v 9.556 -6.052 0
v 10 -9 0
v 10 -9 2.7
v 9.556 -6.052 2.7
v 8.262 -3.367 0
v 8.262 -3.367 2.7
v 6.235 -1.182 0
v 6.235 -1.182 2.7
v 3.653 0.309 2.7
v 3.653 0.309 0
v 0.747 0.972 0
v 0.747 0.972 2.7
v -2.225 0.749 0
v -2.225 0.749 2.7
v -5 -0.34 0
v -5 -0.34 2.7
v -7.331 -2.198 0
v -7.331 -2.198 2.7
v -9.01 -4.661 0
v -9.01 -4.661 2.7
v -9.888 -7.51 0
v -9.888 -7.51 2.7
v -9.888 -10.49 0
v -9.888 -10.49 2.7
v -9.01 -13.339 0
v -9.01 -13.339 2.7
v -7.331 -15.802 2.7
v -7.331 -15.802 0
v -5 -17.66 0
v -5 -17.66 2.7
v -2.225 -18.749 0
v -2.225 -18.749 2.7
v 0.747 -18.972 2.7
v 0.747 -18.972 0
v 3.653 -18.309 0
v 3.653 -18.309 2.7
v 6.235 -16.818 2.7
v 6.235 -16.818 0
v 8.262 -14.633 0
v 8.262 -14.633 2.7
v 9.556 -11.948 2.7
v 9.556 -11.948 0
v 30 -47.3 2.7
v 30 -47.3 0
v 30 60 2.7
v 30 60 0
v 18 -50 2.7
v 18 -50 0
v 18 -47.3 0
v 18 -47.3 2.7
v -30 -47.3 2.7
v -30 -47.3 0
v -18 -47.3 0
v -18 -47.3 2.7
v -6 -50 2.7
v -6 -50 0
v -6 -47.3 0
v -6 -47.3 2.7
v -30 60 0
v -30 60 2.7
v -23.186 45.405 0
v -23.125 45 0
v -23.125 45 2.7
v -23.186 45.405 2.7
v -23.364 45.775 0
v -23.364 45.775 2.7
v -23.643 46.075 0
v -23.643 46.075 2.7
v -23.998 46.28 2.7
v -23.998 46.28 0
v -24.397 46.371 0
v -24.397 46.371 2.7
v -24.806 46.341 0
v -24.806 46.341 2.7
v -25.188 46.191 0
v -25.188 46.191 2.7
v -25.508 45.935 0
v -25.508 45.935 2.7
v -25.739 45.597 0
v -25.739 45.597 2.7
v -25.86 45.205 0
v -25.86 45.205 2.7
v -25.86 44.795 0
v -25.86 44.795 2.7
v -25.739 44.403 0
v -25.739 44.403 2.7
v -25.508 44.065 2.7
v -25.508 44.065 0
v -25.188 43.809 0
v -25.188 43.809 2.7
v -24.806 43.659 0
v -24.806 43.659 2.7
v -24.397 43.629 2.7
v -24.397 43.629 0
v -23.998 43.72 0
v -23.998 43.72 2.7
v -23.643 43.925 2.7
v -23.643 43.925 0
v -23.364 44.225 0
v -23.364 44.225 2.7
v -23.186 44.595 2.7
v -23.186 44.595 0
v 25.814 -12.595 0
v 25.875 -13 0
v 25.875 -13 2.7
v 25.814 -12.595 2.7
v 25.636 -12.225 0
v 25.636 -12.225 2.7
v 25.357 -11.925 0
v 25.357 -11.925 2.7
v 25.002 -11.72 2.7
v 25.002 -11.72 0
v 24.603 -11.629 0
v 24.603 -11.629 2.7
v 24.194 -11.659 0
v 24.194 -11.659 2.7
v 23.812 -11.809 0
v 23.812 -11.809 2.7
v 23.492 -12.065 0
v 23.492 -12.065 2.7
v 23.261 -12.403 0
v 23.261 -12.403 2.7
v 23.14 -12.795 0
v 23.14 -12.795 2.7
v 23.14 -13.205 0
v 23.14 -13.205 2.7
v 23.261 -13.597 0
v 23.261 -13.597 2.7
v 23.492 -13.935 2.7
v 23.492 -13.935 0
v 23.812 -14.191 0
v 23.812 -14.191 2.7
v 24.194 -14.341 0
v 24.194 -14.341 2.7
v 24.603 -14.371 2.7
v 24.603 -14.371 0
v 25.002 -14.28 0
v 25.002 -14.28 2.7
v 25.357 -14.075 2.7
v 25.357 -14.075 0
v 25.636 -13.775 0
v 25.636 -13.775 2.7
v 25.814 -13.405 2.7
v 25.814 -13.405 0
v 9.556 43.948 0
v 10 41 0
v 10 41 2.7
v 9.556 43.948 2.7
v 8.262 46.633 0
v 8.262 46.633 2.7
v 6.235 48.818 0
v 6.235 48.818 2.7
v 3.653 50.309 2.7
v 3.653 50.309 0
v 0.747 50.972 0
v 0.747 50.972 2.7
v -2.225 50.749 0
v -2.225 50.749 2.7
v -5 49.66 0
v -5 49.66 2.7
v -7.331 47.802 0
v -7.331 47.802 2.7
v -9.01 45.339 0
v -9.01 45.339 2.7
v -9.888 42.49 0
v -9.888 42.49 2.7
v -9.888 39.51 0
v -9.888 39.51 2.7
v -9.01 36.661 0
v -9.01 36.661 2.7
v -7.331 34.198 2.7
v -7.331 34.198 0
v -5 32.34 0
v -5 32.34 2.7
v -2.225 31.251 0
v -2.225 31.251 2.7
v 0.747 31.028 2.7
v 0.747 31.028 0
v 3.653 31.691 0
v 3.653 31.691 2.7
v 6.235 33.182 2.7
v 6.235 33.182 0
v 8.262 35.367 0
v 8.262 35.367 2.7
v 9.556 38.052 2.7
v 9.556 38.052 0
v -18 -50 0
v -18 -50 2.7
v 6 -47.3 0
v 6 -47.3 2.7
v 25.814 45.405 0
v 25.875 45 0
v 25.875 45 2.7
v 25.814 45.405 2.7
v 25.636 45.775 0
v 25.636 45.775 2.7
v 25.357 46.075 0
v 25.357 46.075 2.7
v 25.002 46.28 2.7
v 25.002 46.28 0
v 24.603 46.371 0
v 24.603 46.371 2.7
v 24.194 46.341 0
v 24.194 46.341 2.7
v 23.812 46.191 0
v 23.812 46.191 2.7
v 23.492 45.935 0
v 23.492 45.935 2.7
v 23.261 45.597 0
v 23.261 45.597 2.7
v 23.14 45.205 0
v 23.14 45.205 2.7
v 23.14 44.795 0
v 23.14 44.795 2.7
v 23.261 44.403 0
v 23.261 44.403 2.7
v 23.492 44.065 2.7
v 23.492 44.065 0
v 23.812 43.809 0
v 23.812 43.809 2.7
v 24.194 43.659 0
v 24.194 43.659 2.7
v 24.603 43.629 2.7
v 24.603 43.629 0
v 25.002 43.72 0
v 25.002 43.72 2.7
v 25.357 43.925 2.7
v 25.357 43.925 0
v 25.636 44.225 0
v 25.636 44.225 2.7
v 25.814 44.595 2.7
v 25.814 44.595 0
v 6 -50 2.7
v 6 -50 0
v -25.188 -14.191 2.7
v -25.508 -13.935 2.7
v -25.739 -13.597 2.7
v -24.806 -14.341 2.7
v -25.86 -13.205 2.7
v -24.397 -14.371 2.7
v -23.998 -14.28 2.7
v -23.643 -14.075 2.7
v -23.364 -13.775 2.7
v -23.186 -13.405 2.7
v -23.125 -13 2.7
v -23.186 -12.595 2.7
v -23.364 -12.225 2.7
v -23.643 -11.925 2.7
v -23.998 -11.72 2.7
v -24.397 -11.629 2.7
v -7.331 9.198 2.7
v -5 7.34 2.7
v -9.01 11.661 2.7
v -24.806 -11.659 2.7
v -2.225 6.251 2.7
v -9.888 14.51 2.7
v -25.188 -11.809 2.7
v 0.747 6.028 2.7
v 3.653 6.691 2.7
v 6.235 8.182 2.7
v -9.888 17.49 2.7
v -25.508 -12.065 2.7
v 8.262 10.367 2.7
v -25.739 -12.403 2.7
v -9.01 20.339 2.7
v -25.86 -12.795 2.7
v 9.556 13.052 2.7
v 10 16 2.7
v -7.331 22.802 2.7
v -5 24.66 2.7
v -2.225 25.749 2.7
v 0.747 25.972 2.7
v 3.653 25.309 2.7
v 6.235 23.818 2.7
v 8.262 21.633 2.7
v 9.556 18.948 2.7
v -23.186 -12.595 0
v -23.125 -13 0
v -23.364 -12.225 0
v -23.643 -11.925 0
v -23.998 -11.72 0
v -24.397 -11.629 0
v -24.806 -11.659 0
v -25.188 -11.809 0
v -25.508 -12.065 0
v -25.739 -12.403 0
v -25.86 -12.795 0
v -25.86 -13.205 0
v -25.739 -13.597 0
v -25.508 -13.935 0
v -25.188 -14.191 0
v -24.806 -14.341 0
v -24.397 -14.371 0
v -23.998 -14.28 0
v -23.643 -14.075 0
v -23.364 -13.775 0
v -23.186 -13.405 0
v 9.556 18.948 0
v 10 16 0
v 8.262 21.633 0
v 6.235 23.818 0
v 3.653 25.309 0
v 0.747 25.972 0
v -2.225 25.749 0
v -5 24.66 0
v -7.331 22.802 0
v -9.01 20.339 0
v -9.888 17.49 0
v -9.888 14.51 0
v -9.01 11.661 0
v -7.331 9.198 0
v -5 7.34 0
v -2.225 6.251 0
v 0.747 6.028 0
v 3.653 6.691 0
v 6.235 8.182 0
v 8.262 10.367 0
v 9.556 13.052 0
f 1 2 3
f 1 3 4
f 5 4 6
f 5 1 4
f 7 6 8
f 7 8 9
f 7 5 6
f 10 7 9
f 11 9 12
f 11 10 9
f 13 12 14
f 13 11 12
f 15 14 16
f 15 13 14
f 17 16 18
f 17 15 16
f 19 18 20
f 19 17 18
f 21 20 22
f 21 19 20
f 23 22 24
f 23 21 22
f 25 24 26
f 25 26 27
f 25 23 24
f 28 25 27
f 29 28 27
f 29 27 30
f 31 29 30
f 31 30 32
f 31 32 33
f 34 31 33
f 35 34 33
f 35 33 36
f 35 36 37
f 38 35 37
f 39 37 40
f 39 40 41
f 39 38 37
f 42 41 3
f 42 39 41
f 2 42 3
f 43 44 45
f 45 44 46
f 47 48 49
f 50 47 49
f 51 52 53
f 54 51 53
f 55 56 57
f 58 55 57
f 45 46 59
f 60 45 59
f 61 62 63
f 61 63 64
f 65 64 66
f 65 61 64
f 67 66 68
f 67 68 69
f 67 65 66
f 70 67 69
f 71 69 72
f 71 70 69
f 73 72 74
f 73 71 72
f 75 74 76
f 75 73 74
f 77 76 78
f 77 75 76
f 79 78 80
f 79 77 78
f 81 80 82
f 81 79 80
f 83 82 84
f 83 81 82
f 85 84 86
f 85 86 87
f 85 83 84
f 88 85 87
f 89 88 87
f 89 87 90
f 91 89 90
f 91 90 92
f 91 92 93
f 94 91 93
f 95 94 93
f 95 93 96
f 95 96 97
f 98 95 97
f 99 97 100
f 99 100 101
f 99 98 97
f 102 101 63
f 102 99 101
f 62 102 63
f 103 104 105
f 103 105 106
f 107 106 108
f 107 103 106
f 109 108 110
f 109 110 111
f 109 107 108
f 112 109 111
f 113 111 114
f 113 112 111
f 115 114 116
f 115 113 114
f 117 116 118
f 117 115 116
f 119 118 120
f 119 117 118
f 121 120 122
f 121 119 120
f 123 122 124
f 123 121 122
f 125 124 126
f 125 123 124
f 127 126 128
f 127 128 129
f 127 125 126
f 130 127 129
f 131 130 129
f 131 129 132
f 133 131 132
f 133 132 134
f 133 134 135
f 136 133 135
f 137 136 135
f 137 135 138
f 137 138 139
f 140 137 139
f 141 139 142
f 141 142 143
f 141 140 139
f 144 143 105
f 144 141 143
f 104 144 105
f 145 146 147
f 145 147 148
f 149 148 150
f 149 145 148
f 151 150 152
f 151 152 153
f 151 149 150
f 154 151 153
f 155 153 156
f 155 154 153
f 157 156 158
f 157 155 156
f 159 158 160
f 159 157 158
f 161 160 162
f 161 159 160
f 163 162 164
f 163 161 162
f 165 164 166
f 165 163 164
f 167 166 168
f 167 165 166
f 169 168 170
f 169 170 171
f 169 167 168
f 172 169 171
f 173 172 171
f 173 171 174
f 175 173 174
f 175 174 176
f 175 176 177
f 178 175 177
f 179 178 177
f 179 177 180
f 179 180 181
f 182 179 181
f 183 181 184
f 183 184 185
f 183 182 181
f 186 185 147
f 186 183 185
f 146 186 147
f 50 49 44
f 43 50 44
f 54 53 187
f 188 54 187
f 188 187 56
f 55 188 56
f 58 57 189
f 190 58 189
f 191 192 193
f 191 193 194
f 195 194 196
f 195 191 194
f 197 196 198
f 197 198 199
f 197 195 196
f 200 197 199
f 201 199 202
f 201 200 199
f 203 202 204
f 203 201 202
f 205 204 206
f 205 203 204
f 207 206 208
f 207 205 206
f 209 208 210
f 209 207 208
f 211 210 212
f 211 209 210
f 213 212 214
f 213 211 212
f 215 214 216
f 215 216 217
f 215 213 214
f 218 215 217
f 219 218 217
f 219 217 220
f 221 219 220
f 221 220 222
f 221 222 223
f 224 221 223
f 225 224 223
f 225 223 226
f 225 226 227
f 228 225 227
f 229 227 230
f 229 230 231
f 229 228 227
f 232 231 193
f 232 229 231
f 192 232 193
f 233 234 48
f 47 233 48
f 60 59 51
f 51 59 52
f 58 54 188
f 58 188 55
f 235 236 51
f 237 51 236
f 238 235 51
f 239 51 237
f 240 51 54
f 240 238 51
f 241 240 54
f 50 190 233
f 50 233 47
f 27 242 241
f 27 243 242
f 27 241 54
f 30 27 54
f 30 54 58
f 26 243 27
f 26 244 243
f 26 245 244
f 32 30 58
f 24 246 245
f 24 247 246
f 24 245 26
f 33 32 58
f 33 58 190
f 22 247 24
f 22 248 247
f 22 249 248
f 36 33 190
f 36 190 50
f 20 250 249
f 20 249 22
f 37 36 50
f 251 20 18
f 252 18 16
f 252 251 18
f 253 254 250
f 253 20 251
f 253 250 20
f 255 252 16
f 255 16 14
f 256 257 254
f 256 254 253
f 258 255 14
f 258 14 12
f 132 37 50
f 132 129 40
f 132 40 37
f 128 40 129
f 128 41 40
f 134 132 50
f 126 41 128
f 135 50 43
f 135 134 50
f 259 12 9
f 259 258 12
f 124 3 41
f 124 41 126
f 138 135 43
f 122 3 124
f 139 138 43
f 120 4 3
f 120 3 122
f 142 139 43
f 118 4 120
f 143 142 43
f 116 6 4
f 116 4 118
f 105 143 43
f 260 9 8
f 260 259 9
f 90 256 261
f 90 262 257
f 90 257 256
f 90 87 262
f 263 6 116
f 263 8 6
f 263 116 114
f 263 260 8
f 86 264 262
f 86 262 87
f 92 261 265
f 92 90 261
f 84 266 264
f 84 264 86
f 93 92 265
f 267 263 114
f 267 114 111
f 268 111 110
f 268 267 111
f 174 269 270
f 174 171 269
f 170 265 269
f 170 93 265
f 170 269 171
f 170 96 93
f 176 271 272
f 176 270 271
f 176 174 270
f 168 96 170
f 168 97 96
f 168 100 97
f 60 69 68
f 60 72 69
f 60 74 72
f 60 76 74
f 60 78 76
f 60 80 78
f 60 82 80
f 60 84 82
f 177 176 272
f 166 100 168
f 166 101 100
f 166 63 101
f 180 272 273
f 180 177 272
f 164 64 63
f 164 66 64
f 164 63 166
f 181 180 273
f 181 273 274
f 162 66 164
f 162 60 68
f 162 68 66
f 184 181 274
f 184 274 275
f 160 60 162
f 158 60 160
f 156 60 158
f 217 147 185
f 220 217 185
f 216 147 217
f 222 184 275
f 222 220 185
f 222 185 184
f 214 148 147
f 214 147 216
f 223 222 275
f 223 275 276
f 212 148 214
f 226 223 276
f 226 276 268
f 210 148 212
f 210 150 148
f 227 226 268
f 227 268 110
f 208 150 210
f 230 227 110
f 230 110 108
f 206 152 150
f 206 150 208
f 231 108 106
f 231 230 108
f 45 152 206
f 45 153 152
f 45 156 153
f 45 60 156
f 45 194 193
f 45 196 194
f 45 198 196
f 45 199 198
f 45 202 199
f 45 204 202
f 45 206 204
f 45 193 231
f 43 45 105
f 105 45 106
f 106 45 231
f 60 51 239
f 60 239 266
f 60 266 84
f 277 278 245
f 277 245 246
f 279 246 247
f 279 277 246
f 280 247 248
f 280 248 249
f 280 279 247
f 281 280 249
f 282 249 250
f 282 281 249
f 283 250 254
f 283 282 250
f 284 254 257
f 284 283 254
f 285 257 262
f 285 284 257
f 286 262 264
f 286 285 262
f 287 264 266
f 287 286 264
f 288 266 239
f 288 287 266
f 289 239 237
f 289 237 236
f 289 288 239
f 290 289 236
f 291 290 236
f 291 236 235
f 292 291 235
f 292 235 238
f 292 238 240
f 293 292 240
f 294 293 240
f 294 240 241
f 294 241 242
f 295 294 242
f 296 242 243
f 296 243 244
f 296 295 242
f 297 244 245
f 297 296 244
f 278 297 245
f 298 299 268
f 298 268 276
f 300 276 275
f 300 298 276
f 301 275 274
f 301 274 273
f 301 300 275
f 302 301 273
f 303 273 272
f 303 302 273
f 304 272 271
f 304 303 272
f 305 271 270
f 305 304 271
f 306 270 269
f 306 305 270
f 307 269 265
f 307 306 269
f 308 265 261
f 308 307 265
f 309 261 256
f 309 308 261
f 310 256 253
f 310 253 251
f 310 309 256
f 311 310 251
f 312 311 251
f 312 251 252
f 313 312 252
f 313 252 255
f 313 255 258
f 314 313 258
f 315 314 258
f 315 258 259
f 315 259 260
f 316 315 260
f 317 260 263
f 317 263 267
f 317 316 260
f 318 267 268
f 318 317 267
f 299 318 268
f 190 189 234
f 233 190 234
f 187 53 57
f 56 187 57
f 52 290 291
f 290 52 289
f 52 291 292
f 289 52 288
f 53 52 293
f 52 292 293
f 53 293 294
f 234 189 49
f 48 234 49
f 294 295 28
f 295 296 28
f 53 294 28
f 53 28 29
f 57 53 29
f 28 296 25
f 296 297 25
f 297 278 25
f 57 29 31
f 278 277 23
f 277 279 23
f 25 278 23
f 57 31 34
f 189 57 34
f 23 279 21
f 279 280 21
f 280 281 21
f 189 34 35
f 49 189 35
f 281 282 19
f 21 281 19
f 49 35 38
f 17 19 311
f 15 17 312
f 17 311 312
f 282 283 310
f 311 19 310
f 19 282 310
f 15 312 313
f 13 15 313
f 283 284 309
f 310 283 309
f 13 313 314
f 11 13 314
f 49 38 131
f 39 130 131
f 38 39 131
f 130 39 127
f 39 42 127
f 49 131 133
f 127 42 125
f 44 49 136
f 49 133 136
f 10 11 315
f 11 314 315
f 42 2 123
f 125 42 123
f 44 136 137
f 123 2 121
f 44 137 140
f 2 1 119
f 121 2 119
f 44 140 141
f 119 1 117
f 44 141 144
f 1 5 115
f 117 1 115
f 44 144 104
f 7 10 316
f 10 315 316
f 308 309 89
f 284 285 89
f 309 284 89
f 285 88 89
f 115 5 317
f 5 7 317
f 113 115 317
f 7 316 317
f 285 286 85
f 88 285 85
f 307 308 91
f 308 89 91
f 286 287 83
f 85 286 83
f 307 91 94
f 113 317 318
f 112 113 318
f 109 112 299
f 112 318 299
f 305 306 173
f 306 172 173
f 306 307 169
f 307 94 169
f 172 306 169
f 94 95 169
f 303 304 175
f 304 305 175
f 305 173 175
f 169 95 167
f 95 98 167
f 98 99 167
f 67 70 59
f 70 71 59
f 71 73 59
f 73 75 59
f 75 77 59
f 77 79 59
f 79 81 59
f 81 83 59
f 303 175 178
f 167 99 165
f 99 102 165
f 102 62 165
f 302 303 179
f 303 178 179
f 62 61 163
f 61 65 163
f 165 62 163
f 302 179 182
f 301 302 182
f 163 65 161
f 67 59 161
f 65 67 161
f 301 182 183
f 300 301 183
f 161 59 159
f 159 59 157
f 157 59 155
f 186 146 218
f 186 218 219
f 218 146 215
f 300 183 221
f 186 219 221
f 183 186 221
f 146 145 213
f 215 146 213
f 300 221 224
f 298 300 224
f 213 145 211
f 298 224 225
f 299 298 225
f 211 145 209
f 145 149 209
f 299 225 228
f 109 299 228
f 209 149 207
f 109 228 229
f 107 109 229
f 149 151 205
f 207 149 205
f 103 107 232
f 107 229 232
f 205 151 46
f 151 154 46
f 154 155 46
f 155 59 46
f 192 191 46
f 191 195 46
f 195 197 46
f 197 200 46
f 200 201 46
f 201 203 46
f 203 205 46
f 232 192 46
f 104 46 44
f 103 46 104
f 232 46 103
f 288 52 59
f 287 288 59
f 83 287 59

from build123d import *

# Parameters (mm, degrees)
SKETCH1_R           = 1.375
SKETCH1_R_2         = 10
BOSS_EXTRUDE1_DEPTH = 2.7


with BuildPart() as part:
    # Sketch1 → Boss-Extrude1 (new body)
    with BuildSketch(Plane.XY):
        Polygon((30, -47.3), (30, 50), (30, 60), (-30, 60), (-30, 50), (-30, -47.3), (-18, -47.3), (-18, -50), (-6, -50), (-6, -47.3), (6, -47.3), (6, -50), (18, -50), (18, -47.3), align=None)
        with Locations((-24.5, 45)):
            Circle(SKETCH1_R, mode=Mode.SUBTRACT)
        with Locations((24.5, 45)):
            Circle(SKETCH1_R, mode=Mode.SUBTRACT)
        with Locations((-24.5, -13)):
            Circle(SKETCH1_R, mode=Mode.SUBTRACT)
        with Locations((24.5, -13)):
            Circle(SKETCH1_R, mode=Mode.SUBTRACT)
        with Locations((0, 16)):
            Circle(SKETCH1_R_2, mode=Mode.SUBTRACT)
        with Locations((0, 41)):
            Circle(SKETCH1_R_2, mode=Mode.SUBTRACT)
        with Locations((0, -9)):
            Circle(SKETCH1_R_2, mode=Mode.SUBTRACT)
    extrude(amount=BOSS_EXTRUDE1_DEPTH)


solid = part.part
